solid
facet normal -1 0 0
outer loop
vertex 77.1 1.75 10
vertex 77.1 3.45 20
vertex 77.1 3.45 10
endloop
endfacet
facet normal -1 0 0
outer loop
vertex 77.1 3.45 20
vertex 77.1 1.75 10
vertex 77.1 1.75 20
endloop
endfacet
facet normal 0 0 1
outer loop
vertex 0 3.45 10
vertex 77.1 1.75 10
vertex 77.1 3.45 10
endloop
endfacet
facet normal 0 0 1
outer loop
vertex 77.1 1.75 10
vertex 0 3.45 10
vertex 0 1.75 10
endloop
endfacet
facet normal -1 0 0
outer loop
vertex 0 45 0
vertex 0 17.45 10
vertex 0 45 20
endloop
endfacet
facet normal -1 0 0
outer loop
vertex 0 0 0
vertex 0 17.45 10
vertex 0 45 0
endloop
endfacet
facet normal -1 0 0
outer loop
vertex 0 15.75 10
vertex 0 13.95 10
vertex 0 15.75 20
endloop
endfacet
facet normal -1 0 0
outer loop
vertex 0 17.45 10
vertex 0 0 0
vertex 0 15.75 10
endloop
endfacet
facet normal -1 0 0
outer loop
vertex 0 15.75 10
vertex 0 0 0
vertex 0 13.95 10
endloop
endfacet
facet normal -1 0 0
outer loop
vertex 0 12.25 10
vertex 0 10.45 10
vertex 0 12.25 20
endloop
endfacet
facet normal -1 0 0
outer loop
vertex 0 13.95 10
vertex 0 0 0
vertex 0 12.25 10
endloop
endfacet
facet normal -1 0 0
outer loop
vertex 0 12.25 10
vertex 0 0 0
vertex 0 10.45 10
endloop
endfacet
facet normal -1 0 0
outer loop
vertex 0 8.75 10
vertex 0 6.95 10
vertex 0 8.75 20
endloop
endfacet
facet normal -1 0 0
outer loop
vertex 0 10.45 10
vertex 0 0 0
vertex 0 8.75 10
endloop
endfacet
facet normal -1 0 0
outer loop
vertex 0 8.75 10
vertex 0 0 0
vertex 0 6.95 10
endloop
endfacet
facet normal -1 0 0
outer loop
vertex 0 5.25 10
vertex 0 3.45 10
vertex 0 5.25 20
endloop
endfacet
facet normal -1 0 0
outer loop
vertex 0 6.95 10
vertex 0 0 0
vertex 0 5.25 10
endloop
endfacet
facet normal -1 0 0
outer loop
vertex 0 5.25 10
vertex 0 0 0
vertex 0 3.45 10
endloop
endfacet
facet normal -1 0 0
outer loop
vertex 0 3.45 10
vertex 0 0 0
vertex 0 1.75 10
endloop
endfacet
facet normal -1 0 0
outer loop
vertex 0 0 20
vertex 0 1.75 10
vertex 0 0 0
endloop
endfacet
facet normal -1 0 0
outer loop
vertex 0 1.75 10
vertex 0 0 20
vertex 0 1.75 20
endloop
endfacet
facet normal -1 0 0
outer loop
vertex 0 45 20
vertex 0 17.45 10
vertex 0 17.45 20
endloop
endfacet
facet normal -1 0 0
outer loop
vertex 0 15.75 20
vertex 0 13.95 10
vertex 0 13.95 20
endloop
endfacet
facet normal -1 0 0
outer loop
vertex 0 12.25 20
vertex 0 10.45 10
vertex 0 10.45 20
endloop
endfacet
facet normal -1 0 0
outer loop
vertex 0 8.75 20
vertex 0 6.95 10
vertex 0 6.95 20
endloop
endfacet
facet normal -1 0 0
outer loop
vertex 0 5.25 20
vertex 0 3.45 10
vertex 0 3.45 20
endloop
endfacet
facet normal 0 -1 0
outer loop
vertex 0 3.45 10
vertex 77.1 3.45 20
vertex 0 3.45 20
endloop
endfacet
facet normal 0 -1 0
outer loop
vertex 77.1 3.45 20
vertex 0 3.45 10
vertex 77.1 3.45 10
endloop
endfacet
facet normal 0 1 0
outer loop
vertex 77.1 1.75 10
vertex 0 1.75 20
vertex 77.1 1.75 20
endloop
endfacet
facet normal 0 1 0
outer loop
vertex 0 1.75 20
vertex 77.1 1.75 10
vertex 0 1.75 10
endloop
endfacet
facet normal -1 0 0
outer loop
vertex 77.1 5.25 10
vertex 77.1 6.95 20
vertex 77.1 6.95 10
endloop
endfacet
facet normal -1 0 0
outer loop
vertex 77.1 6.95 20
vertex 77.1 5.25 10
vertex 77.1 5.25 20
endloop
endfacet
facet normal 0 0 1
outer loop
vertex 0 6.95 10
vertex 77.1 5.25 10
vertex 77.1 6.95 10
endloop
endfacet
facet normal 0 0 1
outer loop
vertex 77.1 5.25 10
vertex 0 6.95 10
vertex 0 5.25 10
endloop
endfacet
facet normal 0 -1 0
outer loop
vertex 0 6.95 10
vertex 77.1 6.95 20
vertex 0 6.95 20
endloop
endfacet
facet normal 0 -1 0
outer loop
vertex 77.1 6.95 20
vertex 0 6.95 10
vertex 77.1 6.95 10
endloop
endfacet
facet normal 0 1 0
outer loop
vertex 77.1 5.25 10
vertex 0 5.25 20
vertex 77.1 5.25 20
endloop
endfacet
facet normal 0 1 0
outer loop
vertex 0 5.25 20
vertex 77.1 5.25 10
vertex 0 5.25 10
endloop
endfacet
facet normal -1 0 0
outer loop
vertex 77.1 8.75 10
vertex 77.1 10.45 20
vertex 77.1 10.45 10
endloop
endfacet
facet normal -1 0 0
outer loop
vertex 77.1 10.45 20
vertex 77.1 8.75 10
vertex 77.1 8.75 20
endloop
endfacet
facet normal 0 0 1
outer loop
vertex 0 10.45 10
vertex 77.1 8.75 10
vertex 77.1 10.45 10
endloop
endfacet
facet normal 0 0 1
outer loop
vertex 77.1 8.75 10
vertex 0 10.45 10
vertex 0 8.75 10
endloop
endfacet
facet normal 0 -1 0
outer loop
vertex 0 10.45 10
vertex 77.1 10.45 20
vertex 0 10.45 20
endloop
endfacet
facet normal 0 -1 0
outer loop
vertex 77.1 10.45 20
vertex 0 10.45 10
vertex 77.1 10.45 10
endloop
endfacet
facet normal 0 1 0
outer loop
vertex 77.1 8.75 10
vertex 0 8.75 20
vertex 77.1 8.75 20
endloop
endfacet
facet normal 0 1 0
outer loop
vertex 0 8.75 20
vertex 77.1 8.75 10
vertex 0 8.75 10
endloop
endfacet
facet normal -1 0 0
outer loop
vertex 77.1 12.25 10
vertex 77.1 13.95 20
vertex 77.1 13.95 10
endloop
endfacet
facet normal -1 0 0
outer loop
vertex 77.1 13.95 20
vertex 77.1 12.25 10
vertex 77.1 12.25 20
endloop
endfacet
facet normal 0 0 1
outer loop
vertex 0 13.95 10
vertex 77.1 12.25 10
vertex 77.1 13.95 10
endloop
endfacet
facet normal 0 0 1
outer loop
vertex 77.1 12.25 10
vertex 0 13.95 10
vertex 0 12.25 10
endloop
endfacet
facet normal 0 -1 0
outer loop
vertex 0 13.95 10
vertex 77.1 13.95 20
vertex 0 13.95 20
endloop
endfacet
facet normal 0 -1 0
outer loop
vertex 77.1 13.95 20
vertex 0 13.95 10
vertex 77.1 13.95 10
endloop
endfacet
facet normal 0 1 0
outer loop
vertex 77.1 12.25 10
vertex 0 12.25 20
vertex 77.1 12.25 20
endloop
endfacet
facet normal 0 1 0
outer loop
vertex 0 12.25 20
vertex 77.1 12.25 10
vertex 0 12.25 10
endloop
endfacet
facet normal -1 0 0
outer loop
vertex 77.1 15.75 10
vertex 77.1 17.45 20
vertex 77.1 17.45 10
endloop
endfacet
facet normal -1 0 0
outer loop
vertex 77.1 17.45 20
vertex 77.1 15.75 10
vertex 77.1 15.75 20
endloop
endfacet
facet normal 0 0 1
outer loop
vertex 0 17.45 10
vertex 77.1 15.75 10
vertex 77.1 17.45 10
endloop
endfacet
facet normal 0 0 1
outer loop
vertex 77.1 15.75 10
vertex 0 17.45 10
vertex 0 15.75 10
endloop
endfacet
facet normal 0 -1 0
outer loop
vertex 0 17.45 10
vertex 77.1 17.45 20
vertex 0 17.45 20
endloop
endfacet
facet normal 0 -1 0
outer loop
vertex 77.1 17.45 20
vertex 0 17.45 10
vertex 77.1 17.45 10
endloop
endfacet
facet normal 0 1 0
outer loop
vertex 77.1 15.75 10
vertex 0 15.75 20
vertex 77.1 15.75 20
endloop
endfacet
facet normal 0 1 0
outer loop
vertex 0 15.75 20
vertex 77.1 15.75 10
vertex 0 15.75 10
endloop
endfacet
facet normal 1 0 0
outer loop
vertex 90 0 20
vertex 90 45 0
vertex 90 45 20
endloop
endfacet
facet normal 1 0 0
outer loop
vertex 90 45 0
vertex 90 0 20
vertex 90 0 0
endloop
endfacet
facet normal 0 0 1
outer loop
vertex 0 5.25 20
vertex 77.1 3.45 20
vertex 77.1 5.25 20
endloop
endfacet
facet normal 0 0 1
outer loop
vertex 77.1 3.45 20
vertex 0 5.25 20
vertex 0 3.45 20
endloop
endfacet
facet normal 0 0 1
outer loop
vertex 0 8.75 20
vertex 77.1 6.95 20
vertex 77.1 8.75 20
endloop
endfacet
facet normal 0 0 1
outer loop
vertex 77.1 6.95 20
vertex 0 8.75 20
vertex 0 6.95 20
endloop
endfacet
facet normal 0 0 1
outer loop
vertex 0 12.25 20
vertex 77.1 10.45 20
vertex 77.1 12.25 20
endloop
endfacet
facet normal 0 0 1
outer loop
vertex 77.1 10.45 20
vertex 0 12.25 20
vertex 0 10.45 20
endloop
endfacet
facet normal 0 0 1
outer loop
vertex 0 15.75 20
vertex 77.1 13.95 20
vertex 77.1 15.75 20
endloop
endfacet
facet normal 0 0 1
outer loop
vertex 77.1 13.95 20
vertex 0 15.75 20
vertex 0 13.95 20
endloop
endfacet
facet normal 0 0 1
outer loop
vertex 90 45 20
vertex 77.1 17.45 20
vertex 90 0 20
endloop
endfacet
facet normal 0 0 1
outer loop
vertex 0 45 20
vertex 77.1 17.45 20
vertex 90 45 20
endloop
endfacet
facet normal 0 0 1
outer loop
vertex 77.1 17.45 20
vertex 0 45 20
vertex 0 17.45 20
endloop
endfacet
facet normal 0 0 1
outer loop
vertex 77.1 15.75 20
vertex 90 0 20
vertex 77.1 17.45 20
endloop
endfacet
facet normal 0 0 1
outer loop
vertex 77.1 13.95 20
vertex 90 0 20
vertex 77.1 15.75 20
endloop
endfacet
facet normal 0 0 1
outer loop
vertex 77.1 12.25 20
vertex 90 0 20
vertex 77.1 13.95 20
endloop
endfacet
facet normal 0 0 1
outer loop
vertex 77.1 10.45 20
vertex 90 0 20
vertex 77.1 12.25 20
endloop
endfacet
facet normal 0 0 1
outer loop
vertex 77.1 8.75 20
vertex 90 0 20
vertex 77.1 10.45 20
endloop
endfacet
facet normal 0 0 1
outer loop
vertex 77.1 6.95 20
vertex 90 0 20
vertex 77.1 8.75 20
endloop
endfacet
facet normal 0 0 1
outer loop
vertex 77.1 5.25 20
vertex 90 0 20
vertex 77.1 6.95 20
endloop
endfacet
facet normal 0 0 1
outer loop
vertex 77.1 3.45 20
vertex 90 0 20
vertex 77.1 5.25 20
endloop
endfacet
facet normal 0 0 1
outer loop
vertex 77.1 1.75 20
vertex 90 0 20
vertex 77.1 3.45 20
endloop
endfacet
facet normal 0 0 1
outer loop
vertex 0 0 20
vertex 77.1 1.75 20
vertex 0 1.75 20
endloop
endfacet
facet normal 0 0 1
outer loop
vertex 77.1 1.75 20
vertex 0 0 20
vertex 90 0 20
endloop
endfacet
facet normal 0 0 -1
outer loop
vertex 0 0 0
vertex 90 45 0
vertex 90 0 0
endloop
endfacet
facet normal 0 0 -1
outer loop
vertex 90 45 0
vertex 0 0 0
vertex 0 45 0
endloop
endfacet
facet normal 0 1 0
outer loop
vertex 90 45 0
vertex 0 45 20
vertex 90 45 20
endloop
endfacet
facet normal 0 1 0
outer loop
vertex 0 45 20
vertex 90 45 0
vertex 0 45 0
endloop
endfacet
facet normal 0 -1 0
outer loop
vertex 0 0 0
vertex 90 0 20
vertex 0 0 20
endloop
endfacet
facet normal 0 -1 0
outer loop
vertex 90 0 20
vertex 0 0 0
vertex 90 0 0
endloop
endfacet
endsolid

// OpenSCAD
// Drying Rack for 10 Microscope Slides
// Base: 90 x 45 x 20 mm
// Slots: 10 parallel slots, 77mm long, 1.6mm wide, 10mm deep
// Spacing: 3.5mm centre-to-centre (Y)

$fn = 128; // High resolution for smooth slot edges

// Base Dimensions
base_length = 90;  // X
base_width = 45;   // Y
base_height = 20;  // Z

// Slide Dimensions (for reference)
slide_length = 75;
slide_width = 25;
slide_thickness = 1;

// Slot Dimensions
slot_length = 77;  // X
slot_width = 1.6;  // Y
slot_depth = 10;   // Z (cut depth)

// Layout
num_slots = 10;
slot_spacing = 3.5; // Centre-to-centre in Y

// Calculate Y position of the first slot centre
// Total width occupied by slots + gaps
// We need to center the whole group in Y (base_width / 2)
// The group spans from the first slot centre minus (num_slots-1)/2 * spacing to the last
// Actually, simpler: The group of centres is symmetric around 0.
// First slot centre = - ( (num_slots - 1) * slot_spacing ) / 2
first_slot_y = -((num_slots - 1) * slot_spacing) / 2;

// Generate the main block
difference() {
    // 1. Create the solid base block
    translate([0, 0, 0])
    cube([base_length, base_width, base_height]);

    // 2. Cut the 10 slots
    // Slots run along X, so they are extruded in X direction.
    // We define a slot shape and rotate/extrude it, or simply translate it.
    // Since slots are parallel to X, we can define a rectangle in YZ plane and extrude along X.
    
    for (i = [0 : num_slots - 1]) {
        // Calculate Y position for this slot
        y_pos = first_slot_y + i * slot_spacing;
        
        // Define the slot cutter
        // The slot is 77mm long (X), 1.6mm wide (Y), 10mm deep (Z)
        // We need to cut from the top surface (z=20) down to z=10.
        // To ensure clean cuts, we extend slightly past the faces.
        
        translate([
            0,              // X offset (centered on block length)
            y_pos,          // Y offset
            base_height - slot_depth // Z offset (start at top surface)
        ])
        cube([
            slot_length + 0.1, // X: slightly longer than slot_length to cut edges
            slot_width + 0.1,  // Y: slightly wider
            slot_depth + 0.1   // Z: slightly deeper
        ]);
    }
}
